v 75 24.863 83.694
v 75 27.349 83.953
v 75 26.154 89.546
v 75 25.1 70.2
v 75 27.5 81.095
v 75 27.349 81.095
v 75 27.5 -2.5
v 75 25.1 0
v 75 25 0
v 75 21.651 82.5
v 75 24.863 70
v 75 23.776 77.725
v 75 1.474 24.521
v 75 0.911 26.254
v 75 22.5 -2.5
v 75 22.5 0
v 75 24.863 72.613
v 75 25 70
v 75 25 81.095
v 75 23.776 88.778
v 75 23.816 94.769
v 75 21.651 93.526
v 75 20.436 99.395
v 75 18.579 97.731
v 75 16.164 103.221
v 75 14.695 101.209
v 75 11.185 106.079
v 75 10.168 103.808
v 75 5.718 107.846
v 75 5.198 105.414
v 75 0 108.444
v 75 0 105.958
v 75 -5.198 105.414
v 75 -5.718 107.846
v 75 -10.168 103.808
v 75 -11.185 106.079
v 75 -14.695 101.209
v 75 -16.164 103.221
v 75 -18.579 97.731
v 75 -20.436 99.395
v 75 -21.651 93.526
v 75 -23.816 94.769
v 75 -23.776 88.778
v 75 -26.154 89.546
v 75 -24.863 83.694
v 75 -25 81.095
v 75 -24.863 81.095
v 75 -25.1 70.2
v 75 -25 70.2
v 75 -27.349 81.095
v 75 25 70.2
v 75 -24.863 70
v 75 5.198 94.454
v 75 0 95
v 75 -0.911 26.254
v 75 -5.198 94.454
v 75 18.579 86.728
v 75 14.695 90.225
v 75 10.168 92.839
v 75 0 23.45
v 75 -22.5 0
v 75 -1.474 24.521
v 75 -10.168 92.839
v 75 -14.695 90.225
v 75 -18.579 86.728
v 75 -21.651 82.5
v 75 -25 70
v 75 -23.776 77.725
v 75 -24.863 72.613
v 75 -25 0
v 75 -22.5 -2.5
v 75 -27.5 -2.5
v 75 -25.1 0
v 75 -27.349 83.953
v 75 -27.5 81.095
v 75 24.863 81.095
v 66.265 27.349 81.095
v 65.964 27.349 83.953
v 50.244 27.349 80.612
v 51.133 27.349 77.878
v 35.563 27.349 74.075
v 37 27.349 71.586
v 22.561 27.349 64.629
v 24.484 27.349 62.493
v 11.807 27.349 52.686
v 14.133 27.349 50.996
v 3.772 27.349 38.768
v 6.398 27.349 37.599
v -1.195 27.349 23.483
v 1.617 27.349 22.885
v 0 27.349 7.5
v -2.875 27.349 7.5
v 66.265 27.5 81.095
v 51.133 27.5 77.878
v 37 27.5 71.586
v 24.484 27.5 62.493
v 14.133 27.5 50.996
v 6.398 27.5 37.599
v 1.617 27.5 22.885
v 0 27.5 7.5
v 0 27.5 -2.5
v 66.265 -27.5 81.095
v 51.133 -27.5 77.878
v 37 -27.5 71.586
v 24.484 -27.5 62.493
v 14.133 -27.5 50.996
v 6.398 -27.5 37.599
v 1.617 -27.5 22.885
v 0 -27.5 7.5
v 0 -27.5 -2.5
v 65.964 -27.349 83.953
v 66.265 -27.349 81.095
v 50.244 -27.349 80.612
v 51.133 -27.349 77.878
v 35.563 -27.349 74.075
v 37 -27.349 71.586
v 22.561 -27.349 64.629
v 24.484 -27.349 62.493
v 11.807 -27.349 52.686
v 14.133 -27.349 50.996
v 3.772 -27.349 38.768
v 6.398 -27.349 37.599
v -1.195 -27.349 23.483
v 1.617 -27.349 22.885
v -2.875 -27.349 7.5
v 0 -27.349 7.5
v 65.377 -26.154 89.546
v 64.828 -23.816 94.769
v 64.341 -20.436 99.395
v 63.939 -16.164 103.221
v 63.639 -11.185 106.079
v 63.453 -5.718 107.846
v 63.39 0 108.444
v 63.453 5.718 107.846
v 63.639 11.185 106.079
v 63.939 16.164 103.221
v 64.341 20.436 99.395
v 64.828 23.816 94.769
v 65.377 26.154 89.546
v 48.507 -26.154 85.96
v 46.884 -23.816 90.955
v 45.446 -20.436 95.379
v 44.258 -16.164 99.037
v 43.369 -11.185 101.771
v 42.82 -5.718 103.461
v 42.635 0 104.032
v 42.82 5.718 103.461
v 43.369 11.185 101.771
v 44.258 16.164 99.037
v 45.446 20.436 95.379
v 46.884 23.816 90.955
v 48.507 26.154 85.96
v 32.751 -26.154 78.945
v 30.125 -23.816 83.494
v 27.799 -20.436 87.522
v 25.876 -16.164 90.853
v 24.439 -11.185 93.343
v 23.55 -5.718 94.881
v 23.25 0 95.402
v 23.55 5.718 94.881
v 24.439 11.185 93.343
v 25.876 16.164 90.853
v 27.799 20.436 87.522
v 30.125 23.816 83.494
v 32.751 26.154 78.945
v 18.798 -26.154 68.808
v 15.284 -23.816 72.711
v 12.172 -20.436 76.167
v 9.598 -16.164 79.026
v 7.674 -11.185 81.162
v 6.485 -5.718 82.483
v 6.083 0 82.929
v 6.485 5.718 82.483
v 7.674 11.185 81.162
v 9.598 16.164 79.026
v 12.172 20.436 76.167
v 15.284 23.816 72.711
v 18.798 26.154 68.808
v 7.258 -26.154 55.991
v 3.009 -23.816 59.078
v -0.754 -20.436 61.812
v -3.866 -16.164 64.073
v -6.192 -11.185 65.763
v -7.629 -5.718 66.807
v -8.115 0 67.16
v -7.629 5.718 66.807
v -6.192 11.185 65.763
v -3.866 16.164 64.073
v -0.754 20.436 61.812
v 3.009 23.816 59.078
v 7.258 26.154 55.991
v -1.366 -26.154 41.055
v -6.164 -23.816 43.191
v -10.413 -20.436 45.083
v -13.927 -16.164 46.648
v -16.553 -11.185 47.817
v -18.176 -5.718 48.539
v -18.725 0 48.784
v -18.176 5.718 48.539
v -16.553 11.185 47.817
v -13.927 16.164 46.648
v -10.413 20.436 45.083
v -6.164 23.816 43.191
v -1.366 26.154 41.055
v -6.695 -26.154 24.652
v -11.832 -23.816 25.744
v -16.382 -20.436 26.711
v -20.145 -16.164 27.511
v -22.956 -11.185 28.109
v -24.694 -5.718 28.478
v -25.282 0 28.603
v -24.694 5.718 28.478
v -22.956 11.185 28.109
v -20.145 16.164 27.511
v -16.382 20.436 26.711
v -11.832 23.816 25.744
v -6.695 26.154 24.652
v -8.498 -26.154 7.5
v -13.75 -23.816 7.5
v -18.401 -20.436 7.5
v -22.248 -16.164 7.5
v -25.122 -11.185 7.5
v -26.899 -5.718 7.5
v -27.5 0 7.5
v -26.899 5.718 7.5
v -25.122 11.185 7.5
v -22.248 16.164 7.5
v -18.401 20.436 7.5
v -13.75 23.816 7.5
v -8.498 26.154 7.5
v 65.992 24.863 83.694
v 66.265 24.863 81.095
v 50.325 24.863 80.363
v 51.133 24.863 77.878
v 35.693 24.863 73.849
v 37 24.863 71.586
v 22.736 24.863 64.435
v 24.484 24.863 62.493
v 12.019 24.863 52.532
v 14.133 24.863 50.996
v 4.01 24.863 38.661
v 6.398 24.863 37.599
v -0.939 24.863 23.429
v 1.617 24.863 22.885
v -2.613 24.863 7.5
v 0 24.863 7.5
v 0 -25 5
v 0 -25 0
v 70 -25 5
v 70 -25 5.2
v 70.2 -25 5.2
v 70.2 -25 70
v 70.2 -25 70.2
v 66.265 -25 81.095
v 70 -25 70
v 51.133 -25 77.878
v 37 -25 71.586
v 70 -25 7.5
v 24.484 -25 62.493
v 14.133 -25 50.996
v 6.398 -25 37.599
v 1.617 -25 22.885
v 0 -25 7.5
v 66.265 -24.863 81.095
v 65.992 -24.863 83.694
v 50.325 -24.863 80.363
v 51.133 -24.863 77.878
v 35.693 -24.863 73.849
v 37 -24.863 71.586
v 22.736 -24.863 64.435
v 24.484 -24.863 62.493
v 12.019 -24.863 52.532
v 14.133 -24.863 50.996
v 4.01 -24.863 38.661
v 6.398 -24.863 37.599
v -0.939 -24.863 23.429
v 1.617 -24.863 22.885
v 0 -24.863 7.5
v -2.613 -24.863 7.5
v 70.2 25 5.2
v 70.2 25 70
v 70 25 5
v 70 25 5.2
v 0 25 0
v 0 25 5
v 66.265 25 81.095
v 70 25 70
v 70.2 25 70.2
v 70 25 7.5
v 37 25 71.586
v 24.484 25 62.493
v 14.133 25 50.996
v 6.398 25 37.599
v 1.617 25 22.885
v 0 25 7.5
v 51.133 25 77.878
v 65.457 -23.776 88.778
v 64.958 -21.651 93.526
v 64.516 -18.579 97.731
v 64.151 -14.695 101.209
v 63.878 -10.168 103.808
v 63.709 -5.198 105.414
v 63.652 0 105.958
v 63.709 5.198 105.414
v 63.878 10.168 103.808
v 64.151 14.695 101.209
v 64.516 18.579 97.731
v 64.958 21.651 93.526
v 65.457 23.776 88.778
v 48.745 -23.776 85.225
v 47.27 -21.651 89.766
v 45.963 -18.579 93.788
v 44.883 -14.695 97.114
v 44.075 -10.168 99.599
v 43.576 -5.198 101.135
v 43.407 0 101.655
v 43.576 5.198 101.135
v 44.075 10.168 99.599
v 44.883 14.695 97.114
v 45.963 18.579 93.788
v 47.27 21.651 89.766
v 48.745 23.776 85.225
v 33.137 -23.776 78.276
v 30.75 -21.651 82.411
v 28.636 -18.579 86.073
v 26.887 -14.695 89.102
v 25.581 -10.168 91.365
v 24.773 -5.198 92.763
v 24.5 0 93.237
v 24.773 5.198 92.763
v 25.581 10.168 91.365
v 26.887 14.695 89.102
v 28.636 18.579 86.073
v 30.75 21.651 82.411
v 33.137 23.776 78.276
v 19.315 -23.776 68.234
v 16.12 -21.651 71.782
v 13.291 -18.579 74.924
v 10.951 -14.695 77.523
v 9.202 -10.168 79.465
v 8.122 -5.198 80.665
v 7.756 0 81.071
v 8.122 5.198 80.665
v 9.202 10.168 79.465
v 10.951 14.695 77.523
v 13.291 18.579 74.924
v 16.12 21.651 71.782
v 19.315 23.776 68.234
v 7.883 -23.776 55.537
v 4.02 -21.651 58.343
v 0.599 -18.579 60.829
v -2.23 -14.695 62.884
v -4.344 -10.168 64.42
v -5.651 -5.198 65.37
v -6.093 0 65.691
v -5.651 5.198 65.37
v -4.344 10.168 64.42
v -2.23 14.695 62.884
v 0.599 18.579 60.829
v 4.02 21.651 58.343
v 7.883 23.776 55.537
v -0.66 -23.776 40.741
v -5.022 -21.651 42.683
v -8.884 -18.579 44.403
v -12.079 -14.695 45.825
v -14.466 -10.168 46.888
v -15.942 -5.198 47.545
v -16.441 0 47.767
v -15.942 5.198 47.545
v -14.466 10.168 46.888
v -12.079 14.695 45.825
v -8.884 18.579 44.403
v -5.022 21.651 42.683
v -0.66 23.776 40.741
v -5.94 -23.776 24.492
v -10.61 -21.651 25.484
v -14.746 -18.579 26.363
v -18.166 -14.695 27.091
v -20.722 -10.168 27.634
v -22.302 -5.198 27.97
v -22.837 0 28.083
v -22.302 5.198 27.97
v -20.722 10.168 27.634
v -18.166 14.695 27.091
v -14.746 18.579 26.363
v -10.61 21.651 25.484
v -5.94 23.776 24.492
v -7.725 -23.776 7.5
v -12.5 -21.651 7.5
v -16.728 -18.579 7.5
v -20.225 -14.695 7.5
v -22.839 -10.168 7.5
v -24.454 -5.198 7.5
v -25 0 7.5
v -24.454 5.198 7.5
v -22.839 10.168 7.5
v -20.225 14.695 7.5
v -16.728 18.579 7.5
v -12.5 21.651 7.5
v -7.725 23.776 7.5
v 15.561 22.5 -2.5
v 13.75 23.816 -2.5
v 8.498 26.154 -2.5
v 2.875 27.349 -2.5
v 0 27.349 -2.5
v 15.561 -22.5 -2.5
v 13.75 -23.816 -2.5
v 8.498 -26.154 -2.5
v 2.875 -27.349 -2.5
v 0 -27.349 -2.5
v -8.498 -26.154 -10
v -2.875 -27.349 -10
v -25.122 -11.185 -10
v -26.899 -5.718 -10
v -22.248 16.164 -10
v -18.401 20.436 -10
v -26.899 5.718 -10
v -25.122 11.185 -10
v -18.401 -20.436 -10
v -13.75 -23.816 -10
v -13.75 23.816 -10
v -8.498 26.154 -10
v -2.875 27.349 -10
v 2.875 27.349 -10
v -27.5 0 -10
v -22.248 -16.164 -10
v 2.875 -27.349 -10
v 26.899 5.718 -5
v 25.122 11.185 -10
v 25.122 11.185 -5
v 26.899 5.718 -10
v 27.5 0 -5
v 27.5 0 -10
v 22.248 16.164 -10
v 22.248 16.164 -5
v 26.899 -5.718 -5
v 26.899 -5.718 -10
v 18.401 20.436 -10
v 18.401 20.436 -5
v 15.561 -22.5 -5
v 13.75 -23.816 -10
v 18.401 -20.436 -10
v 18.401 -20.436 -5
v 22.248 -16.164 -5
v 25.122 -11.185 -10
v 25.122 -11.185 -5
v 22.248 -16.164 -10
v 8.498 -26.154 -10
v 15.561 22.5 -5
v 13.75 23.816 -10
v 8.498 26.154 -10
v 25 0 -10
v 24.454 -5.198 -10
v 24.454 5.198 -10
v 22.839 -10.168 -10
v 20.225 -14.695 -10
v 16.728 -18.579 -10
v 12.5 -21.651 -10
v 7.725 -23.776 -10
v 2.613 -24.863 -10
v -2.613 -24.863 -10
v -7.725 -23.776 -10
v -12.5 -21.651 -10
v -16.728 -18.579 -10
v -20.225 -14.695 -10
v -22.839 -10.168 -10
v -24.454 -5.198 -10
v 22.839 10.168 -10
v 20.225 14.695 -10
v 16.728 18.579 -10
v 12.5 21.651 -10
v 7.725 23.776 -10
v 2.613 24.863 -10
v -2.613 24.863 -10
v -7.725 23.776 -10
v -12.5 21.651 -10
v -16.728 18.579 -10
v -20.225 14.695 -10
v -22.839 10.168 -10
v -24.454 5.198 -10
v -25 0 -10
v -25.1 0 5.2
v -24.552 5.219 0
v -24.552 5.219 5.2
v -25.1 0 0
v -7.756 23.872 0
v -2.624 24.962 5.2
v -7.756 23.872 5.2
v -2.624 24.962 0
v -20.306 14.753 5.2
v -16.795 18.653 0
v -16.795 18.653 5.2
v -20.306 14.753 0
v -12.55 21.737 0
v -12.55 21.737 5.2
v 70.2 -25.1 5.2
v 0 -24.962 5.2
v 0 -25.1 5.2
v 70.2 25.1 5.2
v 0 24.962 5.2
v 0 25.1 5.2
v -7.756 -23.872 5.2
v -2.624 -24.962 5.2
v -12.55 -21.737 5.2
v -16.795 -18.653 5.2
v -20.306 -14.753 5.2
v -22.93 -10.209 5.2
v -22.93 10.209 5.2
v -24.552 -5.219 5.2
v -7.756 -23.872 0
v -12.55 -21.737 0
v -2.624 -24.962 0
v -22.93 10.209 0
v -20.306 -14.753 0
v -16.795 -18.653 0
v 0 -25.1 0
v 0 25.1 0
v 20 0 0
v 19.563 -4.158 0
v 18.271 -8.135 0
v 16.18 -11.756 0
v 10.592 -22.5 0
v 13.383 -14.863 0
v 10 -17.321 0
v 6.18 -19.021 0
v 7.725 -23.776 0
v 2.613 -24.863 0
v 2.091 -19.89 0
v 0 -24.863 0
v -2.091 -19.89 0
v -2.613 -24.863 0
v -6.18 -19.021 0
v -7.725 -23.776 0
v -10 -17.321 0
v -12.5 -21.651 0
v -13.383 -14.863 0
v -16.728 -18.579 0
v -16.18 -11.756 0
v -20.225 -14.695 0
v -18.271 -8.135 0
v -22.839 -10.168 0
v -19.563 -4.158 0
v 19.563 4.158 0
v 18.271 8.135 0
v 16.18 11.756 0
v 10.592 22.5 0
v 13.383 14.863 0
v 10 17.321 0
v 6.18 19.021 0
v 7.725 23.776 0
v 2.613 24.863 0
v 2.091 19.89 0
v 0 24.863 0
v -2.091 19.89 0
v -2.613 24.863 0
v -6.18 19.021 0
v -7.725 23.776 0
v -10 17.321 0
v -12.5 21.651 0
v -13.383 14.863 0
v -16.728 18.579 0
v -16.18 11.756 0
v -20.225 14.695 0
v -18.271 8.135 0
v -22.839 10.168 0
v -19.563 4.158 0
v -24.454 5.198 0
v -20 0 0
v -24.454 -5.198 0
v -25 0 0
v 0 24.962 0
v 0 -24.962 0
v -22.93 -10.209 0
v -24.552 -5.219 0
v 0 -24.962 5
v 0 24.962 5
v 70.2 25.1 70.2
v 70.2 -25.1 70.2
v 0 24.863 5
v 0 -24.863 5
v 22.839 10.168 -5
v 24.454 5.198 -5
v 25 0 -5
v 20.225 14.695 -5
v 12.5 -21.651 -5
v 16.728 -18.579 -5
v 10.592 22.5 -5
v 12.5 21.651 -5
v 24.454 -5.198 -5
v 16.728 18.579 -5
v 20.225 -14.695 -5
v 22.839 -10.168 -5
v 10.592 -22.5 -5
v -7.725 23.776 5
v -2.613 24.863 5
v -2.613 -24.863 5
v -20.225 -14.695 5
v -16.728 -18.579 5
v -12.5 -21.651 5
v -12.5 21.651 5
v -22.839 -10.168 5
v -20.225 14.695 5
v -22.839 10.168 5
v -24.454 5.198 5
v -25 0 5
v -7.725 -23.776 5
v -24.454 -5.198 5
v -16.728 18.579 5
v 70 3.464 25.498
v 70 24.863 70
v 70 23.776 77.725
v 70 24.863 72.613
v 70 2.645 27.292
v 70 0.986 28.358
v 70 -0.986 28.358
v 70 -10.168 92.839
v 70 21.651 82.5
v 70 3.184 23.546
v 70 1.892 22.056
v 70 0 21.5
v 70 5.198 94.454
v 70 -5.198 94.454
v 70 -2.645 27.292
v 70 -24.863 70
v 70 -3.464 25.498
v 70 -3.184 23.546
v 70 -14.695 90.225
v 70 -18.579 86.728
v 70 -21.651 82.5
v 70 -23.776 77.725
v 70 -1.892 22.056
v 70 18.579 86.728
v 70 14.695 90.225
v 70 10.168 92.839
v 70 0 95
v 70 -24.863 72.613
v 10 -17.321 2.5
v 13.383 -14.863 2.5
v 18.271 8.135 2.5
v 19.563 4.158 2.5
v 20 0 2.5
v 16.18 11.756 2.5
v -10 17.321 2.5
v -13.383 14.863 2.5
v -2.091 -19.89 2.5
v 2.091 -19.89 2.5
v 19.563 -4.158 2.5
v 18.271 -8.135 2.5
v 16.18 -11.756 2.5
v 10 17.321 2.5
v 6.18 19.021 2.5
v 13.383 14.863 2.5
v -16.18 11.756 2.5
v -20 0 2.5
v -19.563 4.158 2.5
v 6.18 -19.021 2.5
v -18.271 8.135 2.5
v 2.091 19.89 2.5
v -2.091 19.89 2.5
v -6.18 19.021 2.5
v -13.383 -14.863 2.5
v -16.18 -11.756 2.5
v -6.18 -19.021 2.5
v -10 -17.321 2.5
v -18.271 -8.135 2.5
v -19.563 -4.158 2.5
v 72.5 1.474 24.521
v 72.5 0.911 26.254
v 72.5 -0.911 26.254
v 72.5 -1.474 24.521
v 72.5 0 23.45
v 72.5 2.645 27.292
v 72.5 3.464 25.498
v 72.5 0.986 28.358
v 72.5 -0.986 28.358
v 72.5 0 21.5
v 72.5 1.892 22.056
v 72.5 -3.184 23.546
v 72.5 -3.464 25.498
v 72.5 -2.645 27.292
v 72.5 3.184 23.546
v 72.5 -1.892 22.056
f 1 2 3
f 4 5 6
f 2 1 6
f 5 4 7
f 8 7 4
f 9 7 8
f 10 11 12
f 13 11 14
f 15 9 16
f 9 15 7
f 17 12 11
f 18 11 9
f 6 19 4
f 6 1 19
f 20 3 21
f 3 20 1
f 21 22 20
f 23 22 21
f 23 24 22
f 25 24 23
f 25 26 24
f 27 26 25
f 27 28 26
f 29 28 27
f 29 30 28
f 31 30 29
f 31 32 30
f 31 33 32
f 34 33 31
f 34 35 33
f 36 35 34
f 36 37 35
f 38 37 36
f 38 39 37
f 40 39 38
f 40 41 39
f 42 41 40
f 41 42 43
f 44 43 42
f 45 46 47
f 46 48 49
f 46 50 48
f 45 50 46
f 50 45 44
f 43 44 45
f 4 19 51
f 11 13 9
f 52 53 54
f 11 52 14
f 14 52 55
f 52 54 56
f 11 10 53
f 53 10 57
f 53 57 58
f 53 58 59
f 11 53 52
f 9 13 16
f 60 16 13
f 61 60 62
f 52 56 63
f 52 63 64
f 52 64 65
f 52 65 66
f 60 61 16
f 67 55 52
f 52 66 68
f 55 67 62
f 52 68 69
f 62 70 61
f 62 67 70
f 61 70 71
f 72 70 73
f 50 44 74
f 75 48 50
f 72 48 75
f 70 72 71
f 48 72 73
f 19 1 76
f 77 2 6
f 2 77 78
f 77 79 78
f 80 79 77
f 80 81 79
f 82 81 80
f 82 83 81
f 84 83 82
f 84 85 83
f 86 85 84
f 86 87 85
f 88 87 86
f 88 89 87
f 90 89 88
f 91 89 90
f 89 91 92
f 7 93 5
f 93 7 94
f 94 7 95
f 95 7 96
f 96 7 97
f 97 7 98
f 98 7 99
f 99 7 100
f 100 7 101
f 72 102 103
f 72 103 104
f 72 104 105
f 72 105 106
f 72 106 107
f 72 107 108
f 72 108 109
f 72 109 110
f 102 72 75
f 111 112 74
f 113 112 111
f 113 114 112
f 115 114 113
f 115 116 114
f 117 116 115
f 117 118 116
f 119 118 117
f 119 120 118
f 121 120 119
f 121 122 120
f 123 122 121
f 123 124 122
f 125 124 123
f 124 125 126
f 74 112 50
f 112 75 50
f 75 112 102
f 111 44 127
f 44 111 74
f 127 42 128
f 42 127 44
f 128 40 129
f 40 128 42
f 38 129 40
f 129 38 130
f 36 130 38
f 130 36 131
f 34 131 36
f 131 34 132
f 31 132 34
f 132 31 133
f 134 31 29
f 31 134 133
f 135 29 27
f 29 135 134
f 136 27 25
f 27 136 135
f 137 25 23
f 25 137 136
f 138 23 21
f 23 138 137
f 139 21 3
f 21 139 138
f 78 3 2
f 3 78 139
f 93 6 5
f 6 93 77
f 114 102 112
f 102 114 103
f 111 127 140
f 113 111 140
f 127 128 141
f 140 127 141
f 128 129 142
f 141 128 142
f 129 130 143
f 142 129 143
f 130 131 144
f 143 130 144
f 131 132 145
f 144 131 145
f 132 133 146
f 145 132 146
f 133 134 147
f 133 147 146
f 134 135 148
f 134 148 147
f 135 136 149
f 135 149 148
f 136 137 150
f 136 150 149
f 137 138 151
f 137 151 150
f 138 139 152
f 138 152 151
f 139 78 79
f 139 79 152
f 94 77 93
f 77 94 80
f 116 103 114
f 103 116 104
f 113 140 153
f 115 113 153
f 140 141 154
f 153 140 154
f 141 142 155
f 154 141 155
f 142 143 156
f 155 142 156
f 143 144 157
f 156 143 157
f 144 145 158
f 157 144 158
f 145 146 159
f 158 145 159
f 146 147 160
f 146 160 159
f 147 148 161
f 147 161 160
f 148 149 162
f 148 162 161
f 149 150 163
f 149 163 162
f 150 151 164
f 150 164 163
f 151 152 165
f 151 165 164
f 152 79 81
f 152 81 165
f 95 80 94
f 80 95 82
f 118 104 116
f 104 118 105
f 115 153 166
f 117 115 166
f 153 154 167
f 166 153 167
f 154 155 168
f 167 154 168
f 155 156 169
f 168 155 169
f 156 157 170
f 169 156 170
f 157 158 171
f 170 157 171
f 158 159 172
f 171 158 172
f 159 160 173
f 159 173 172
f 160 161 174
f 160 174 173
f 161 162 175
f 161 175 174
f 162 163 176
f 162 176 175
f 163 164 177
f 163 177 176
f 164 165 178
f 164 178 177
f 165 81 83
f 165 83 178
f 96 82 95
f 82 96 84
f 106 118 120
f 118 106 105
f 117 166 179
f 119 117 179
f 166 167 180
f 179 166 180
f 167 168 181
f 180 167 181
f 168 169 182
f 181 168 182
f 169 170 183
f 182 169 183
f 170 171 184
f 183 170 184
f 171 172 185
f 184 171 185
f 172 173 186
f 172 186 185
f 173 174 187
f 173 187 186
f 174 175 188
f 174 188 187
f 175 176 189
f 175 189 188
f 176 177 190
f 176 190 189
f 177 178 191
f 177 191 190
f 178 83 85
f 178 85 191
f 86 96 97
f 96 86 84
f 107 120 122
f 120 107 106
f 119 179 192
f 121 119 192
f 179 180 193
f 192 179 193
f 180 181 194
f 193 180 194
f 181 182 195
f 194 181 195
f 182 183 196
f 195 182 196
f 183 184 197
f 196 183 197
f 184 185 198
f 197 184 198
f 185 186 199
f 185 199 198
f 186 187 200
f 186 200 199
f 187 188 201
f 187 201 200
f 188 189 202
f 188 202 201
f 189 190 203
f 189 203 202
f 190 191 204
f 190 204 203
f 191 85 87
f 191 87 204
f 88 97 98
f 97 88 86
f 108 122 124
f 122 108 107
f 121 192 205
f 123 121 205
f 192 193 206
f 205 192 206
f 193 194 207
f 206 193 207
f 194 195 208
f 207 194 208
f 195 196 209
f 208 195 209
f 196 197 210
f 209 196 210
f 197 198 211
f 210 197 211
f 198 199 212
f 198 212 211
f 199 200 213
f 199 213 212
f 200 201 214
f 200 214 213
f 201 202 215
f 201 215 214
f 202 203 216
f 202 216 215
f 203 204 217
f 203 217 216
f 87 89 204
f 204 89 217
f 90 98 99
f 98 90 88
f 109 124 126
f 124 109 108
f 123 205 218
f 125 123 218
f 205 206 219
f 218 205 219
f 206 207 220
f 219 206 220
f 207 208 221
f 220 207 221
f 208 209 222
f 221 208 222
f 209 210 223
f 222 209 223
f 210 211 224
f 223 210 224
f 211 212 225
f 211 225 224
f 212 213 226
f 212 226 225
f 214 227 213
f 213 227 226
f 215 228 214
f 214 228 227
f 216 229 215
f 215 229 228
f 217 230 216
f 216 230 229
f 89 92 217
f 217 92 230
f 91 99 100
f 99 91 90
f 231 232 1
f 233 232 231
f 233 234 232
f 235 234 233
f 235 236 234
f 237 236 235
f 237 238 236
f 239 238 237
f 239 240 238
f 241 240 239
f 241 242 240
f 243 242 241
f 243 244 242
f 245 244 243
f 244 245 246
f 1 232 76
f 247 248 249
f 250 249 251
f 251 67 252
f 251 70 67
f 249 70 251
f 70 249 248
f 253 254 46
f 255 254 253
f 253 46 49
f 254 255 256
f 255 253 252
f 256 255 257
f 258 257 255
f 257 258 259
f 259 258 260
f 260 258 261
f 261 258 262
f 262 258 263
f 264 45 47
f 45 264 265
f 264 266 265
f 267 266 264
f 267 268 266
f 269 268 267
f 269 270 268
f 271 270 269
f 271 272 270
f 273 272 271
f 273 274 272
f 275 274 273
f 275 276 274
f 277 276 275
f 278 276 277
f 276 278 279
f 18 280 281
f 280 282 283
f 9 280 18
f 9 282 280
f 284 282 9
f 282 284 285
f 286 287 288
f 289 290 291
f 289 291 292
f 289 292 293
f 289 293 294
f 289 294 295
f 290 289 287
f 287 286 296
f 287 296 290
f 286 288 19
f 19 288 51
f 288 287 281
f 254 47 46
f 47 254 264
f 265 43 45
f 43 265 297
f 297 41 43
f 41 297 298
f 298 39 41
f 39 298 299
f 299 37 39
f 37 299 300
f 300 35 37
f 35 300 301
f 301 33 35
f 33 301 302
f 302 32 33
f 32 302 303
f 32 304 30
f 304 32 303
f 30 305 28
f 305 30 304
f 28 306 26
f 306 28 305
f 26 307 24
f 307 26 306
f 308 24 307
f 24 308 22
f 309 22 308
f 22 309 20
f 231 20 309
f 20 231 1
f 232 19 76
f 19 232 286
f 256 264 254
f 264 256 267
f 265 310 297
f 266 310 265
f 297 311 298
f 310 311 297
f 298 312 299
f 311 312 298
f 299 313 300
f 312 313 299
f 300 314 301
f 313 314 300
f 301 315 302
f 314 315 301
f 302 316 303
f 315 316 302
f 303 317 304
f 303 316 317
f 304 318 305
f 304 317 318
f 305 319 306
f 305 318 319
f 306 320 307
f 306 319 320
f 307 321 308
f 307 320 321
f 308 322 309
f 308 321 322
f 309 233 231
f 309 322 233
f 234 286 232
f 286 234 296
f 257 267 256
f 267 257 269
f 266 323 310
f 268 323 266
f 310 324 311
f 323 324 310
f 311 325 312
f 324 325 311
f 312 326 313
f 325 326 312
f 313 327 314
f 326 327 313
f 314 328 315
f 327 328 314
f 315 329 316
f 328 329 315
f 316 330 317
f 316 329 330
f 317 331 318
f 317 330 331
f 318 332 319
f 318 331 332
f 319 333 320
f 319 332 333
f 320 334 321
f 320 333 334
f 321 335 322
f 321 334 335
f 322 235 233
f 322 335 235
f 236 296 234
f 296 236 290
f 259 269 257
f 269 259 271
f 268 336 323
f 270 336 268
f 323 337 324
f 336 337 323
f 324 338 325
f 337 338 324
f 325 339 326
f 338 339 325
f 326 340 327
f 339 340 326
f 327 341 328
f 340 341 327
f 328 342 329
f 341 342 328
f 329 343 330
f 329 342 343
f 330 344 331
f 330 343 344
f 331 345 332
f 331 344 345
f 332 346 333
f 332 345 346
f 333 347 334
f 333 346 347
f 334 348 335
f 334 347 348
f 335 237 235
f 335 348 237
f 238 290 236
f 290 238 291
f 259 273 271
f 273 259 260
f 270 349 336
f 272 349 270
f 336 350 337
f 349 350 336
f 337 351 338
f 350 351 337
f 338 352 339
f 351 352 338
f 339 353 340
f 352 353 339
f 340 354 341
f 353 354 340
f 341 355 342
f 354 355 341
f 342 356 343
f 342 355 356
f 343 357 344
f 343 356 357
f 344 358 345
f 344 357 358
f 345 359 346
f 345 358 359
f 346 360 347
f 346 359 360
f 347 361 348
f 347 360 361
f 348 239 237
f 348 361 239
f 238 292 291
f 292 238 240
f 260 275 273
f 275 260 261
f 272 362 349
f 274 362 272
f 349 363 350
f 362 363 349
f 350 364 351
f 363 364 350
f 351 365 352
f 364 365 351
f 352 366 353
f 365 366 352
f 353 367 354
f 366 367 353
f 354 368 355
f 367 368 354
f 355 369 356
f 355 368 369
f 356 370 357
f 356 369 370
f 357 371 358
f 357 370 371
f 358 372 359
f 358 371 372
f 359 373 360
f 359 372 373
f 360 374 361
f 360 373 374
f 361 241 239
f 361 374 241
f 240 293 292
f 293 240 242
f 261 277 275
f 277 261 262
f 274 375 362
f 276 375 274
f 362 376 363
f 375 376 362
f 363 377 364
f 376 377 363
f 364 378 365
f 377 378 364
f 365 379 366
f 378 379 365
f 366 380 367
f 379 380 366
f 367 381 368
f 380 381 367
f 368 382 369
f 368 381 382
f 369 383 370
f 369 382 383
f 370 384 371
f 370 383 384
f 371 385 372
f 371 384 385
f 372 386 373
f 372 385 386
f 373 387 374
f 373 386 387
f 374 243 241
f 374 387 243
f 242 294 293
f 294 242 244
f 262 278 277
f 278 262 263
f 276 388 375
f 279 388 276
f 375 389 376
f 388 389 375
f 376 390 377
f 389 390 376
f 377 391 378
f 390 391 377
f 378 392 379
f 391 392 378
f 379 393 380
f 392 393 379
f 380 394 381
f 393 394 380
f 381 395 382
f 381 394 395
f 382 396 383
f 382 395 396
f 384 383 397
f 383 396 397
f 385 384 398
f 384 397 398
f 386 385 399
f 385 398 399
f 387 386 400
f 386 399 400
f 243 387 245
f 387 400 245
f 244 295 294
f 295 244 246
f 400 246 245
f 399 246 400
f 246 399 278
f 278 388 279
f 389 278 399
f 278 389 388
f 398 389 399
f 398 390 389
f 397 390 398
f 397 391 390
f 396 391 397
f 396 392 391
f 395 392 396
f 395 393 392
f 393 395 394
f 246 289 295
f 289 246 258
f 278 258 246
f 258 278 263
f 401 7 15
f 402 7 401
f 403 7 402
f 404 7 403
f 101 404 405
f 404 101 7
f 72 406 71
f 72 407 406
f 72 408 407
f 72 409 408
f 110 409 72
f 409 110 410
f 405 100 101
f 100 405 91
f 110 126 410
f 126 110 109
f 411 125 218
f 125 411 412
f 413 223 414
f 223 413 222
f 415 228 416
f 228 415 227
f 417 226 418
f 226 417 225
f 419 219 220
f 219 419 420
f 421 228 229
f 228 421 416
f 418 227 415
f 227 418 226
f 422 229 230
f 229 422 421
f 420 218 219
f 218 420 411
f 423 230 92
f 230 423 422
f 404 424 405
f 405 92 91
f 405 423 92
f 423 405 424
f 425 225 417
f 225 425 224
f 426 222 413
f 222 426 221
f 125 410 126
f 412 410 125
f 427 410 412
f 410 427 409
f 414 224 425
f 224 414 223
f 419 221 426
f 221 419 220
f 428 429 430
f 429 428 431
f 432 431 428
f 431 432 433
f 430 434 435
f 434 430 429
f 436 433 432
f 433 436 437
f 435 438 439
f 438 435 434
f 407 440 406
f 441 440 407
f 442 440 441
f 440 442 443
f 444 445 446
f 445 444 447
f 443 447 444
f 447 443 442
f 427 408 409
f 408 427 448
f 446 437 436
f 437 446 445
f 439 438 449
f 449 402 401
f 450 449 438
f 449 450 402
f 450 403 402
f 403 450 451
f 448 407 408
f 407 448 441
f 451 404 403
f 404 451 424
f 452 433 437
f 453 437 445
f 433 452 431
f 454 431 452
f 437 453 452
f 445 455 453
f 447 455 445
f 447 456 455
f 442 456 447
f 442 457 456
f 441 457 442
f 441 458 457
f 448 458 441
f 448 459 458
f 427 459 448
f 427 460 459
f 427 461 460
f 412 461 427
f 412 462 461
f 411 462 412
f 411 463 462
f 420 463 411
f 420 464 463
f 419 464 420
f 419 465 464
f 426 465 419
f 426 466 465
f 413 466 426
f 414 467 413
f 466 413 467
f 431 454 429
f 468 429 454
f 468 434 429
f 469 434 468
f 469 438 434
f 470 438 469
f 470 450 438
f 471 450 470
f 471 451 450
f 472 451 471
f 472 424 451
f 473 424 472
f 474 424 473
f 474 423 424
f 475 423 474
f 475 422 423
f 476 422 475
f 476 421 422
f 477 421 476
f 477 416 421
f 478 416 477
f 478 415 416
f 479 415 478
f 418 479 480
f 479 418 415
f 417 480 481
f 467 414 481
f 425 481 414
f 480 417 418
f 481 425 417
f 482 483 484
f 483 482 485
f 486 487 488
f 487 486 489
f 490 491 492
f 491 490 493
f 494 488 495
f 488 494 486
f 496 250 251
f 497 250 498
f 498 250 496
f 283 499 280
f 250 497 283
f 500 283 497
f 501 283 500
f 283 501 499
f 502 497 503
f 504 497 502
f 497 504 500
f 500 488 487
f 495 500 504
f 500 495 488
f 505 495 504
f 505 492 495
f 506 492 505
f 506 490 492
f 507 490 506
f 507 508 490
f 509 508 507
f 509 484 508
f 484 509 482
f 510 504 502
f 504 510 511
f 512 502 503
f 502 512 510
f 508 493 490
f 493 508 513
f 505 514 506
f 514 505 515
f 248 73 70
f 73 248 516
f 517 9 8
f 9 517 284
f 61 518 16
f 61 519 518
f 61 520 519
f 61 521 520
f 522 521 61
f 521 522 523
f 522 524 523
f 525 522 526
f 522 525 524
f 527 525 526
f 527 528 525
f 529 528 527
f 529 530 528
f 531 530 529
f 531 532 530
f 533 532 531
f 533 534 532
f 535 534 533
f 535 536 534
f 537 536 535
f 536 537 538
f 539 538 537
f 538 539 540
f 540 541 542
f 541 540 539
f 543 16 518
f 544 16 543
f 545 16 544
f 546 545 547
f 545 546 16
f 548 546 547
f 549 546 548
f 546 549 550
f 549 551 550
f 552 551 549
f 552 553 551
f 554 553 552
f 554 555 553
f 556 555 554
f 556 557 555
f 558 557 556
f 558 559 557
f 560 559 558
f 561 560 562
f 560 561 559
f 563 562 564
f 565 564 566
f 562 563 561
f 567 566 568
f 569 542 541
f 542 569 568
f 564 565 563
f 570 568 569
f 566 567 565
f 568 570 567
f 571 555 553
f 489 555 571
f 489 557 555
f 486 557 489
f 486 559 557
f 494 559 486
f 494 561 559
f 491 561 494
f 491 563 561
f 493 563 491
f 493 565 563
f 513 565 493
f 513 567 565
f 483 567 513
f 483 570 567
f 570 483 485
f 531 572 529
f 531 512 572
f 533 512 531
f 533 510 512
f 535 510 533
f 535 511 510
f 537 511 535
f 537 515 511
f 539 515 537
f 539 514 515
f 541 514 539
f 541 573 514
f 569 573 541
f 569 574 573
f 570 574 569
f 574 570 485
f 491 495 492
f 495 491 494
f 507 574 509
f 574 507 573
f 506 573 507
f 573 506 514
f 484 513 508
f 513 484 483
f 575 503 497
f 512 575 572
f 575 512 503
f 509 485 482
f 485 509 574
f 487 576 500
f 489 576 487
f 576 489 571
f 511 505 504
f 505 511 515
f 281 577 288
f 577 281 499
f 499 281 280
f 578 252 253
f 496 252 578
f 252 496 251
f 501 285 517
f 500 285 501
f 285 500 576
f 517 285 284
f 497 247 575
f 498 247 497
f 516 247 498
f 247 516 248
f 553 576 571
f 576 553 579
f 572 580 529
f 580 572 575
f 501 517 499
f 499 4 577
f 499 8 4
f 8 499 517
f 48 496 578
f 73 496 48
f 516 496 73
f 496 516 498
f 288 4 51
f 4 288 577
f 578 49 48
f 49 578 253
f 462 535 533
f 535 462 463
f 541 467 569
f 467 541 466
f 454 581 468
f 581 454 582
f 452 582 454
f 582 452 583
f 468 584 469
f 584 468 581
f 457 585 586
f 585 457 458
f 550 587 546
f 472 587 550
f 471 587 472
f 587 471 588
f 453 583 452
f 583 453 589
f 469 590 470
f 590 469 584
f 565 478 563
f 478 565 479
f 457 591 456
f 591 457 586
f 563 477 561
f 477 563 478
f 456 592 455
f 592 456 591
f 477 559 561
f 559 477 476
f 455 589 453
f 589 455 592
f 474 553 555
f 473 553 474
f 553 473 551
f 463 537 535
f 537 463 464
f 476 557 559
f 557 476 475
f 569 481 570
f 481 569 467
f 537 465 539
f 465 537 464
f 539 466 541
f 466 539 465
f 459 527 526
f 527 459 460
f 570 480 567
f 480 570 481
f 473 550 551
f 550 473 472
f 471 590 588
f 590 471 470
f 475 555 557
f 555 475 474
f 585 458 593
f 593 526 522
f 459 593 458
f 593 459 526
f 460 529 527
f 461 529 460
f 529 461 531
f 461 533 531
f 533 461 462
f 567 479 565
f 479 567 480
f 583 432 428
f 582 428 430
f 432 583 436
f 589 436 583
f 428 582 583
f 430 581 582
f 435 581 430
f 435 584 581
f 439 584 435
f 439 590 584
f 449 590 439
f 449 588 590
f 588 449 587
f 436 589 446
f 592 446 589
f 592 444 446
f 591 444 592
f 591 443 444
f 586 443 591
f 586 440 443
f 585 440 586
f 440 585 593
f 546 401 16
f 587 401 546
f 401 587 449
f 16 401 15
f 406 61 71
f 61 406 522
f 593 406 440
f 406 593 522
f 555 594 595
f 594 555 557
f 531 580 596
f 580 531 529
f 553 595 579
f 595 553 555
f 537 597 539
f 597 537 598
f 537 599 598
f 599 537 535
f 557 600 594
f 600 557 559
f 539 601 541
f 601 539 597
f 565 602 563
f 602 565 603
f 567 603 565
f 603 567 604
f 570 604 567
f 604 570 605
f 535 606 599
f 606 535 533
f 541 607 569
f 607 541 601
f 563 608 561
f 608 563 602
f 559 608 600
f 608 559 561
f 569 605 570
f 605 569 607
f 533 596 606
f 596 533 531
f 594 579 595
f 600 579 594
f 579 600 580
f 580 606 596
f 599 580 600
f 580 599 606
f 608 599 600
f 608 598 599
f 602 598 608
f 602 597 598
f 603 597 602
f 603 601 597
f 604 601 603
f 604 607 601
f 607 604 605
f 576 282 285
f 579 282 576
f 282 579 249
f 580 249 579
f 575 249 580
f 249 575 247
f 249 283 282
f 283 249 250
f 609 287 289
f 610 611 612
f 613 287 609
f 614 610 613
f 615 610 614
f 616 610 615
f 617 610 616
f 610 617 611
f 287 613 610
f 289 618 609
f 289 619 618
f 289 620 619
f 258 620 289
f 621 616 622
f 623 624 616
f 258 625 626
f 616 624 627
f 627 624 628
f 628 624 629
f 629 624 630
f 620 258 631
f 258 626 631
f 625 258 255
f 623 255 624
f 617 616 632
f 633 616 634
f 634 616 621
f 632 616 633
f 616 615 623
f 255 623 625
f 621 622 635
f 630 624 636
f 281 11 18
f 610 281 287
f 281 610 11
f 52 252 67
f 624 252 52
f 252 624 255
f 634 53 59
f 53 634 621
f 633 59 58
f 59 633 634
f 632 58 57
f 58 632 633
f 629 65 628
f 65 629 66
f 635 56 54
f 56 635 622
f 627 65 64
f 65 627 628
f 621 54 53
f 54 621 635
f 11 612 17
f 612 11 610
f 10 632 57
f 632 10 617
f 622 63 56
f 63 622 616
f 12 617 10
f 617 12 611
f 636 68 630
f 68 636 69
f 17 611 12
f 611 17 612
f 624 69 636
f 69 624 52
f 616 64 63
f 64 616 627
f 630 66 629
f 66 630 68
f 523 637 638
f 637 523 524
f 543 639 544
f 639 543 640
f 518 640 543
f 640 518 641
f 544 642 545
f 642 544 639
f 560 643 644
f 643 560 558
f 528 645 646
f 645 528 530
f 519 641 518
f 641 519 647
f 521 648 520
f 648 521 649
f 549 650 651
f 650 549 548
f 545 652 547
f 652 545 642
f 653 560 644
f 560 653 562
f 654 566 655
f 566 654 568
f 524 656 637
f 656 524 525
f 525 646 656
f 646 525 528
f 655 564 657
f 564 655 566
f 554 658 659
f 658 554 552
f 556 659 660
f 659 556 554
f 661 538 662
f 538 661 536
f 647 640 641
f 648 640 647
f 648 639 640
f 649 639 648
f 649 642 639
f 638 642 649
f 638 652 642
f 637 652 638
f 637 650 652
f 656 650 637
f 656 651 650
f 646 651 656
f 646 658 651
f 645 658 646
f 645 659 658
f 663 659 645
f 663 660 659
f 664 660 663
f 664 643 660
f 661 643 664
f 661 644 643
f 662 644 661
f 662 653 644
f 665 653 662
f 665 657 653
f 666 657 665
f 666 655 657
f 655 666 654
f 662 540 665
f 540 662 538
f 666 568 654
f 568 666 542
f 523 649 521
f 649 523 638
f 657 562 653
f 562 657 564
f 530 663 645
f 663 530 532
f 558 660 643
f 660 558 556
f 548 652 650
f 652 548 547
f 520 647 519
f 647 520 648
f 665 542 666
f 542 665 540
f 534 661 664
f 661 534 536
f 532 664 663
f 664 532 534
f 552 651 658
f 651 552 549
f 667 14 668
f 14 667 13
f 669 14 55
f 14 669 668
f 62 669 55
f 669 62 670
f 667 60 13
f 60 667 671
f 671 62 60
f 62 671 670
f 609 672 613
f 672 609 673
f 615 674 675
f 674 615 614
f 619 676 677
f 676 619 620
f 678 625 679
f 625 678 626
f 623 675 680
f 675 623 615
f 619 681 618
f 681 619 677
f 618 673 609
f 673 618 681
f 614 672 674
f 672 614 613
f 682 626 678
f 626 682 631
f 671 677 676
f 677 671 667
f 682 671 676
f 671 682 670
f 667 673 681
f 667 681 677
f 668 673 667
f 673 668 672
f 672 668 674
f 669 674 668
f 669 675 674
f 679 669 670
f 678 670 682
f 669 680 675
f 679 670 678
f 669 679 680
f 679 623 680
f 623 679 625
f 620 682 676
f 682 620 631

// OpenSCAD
shell();
frame();

module frame(thick=5,width=50,length=70){
    difference(){
        union(){
            cylinder(thick, d=width);
            
            translate([0,-width/2,0])
            cube([length,width,thick]);
            
            translate([length,-width/2,0])
            cube([thick,width,length]);
            
            translate([length,0,length])
            rotate([0,90,0])
            cylinder(thick, d=width);
        }
        
        cylinder(thick/2, d=40);
        
        translate([length,0,width/2])
        rotate([0,90,0])
        cylinder(thick, d=3.1);
        
        translate([length-thick/2,0,width/2])
        rotate([0,90,0])
        cylinder(thick, d=7);
    }
}

module shell(thick=5,width=50,length=70){
    shell_width = width+5;
    shell_thick = thick+5;
    
    difference(){
        union(){
            translate([0,0,-shell_thick])
            cylinder(shell_thick, d=shell_width);
            translate([length+thick-1,0,thick+5/2])
            rotate([90,0,180])
            difference(){
                dish_q(shell_width, length+thick-1);
                dish_q(shell_width-5, length+thick-1);
            }
            
            translate([0,0,-5/2]){
                translate([0,-shell_width/2,0])
                cube([length+thick,shell_width,shell_thick]);
                cylinder(shell_thick, d=shell_width);
            }
        }
        
        translate([0,0,-shell_thick])
        cylinder(shell_thick, d=width);
        
        translate([0,-(width-5)/2,-thick])
        cube([length+thick,width-5,thick]);
        
        translate([0,0,-thick])
        cylinder(thick+5, d=width-5);
        
        frame(5.2,50.2,70.2);    
    }
}
module dish_q(width=50,length=70){
    intersection(){
            translate([-1,-1,-(width+1)/2])
            cube([length+width+2,length+width+2,width+1]);
        
            rotate_extrude()
            translate([-length,0,0])
            union(){
                circle(d=width);
                translate([0,-width/2,0])square([length,width]);
            }
    }    
}
